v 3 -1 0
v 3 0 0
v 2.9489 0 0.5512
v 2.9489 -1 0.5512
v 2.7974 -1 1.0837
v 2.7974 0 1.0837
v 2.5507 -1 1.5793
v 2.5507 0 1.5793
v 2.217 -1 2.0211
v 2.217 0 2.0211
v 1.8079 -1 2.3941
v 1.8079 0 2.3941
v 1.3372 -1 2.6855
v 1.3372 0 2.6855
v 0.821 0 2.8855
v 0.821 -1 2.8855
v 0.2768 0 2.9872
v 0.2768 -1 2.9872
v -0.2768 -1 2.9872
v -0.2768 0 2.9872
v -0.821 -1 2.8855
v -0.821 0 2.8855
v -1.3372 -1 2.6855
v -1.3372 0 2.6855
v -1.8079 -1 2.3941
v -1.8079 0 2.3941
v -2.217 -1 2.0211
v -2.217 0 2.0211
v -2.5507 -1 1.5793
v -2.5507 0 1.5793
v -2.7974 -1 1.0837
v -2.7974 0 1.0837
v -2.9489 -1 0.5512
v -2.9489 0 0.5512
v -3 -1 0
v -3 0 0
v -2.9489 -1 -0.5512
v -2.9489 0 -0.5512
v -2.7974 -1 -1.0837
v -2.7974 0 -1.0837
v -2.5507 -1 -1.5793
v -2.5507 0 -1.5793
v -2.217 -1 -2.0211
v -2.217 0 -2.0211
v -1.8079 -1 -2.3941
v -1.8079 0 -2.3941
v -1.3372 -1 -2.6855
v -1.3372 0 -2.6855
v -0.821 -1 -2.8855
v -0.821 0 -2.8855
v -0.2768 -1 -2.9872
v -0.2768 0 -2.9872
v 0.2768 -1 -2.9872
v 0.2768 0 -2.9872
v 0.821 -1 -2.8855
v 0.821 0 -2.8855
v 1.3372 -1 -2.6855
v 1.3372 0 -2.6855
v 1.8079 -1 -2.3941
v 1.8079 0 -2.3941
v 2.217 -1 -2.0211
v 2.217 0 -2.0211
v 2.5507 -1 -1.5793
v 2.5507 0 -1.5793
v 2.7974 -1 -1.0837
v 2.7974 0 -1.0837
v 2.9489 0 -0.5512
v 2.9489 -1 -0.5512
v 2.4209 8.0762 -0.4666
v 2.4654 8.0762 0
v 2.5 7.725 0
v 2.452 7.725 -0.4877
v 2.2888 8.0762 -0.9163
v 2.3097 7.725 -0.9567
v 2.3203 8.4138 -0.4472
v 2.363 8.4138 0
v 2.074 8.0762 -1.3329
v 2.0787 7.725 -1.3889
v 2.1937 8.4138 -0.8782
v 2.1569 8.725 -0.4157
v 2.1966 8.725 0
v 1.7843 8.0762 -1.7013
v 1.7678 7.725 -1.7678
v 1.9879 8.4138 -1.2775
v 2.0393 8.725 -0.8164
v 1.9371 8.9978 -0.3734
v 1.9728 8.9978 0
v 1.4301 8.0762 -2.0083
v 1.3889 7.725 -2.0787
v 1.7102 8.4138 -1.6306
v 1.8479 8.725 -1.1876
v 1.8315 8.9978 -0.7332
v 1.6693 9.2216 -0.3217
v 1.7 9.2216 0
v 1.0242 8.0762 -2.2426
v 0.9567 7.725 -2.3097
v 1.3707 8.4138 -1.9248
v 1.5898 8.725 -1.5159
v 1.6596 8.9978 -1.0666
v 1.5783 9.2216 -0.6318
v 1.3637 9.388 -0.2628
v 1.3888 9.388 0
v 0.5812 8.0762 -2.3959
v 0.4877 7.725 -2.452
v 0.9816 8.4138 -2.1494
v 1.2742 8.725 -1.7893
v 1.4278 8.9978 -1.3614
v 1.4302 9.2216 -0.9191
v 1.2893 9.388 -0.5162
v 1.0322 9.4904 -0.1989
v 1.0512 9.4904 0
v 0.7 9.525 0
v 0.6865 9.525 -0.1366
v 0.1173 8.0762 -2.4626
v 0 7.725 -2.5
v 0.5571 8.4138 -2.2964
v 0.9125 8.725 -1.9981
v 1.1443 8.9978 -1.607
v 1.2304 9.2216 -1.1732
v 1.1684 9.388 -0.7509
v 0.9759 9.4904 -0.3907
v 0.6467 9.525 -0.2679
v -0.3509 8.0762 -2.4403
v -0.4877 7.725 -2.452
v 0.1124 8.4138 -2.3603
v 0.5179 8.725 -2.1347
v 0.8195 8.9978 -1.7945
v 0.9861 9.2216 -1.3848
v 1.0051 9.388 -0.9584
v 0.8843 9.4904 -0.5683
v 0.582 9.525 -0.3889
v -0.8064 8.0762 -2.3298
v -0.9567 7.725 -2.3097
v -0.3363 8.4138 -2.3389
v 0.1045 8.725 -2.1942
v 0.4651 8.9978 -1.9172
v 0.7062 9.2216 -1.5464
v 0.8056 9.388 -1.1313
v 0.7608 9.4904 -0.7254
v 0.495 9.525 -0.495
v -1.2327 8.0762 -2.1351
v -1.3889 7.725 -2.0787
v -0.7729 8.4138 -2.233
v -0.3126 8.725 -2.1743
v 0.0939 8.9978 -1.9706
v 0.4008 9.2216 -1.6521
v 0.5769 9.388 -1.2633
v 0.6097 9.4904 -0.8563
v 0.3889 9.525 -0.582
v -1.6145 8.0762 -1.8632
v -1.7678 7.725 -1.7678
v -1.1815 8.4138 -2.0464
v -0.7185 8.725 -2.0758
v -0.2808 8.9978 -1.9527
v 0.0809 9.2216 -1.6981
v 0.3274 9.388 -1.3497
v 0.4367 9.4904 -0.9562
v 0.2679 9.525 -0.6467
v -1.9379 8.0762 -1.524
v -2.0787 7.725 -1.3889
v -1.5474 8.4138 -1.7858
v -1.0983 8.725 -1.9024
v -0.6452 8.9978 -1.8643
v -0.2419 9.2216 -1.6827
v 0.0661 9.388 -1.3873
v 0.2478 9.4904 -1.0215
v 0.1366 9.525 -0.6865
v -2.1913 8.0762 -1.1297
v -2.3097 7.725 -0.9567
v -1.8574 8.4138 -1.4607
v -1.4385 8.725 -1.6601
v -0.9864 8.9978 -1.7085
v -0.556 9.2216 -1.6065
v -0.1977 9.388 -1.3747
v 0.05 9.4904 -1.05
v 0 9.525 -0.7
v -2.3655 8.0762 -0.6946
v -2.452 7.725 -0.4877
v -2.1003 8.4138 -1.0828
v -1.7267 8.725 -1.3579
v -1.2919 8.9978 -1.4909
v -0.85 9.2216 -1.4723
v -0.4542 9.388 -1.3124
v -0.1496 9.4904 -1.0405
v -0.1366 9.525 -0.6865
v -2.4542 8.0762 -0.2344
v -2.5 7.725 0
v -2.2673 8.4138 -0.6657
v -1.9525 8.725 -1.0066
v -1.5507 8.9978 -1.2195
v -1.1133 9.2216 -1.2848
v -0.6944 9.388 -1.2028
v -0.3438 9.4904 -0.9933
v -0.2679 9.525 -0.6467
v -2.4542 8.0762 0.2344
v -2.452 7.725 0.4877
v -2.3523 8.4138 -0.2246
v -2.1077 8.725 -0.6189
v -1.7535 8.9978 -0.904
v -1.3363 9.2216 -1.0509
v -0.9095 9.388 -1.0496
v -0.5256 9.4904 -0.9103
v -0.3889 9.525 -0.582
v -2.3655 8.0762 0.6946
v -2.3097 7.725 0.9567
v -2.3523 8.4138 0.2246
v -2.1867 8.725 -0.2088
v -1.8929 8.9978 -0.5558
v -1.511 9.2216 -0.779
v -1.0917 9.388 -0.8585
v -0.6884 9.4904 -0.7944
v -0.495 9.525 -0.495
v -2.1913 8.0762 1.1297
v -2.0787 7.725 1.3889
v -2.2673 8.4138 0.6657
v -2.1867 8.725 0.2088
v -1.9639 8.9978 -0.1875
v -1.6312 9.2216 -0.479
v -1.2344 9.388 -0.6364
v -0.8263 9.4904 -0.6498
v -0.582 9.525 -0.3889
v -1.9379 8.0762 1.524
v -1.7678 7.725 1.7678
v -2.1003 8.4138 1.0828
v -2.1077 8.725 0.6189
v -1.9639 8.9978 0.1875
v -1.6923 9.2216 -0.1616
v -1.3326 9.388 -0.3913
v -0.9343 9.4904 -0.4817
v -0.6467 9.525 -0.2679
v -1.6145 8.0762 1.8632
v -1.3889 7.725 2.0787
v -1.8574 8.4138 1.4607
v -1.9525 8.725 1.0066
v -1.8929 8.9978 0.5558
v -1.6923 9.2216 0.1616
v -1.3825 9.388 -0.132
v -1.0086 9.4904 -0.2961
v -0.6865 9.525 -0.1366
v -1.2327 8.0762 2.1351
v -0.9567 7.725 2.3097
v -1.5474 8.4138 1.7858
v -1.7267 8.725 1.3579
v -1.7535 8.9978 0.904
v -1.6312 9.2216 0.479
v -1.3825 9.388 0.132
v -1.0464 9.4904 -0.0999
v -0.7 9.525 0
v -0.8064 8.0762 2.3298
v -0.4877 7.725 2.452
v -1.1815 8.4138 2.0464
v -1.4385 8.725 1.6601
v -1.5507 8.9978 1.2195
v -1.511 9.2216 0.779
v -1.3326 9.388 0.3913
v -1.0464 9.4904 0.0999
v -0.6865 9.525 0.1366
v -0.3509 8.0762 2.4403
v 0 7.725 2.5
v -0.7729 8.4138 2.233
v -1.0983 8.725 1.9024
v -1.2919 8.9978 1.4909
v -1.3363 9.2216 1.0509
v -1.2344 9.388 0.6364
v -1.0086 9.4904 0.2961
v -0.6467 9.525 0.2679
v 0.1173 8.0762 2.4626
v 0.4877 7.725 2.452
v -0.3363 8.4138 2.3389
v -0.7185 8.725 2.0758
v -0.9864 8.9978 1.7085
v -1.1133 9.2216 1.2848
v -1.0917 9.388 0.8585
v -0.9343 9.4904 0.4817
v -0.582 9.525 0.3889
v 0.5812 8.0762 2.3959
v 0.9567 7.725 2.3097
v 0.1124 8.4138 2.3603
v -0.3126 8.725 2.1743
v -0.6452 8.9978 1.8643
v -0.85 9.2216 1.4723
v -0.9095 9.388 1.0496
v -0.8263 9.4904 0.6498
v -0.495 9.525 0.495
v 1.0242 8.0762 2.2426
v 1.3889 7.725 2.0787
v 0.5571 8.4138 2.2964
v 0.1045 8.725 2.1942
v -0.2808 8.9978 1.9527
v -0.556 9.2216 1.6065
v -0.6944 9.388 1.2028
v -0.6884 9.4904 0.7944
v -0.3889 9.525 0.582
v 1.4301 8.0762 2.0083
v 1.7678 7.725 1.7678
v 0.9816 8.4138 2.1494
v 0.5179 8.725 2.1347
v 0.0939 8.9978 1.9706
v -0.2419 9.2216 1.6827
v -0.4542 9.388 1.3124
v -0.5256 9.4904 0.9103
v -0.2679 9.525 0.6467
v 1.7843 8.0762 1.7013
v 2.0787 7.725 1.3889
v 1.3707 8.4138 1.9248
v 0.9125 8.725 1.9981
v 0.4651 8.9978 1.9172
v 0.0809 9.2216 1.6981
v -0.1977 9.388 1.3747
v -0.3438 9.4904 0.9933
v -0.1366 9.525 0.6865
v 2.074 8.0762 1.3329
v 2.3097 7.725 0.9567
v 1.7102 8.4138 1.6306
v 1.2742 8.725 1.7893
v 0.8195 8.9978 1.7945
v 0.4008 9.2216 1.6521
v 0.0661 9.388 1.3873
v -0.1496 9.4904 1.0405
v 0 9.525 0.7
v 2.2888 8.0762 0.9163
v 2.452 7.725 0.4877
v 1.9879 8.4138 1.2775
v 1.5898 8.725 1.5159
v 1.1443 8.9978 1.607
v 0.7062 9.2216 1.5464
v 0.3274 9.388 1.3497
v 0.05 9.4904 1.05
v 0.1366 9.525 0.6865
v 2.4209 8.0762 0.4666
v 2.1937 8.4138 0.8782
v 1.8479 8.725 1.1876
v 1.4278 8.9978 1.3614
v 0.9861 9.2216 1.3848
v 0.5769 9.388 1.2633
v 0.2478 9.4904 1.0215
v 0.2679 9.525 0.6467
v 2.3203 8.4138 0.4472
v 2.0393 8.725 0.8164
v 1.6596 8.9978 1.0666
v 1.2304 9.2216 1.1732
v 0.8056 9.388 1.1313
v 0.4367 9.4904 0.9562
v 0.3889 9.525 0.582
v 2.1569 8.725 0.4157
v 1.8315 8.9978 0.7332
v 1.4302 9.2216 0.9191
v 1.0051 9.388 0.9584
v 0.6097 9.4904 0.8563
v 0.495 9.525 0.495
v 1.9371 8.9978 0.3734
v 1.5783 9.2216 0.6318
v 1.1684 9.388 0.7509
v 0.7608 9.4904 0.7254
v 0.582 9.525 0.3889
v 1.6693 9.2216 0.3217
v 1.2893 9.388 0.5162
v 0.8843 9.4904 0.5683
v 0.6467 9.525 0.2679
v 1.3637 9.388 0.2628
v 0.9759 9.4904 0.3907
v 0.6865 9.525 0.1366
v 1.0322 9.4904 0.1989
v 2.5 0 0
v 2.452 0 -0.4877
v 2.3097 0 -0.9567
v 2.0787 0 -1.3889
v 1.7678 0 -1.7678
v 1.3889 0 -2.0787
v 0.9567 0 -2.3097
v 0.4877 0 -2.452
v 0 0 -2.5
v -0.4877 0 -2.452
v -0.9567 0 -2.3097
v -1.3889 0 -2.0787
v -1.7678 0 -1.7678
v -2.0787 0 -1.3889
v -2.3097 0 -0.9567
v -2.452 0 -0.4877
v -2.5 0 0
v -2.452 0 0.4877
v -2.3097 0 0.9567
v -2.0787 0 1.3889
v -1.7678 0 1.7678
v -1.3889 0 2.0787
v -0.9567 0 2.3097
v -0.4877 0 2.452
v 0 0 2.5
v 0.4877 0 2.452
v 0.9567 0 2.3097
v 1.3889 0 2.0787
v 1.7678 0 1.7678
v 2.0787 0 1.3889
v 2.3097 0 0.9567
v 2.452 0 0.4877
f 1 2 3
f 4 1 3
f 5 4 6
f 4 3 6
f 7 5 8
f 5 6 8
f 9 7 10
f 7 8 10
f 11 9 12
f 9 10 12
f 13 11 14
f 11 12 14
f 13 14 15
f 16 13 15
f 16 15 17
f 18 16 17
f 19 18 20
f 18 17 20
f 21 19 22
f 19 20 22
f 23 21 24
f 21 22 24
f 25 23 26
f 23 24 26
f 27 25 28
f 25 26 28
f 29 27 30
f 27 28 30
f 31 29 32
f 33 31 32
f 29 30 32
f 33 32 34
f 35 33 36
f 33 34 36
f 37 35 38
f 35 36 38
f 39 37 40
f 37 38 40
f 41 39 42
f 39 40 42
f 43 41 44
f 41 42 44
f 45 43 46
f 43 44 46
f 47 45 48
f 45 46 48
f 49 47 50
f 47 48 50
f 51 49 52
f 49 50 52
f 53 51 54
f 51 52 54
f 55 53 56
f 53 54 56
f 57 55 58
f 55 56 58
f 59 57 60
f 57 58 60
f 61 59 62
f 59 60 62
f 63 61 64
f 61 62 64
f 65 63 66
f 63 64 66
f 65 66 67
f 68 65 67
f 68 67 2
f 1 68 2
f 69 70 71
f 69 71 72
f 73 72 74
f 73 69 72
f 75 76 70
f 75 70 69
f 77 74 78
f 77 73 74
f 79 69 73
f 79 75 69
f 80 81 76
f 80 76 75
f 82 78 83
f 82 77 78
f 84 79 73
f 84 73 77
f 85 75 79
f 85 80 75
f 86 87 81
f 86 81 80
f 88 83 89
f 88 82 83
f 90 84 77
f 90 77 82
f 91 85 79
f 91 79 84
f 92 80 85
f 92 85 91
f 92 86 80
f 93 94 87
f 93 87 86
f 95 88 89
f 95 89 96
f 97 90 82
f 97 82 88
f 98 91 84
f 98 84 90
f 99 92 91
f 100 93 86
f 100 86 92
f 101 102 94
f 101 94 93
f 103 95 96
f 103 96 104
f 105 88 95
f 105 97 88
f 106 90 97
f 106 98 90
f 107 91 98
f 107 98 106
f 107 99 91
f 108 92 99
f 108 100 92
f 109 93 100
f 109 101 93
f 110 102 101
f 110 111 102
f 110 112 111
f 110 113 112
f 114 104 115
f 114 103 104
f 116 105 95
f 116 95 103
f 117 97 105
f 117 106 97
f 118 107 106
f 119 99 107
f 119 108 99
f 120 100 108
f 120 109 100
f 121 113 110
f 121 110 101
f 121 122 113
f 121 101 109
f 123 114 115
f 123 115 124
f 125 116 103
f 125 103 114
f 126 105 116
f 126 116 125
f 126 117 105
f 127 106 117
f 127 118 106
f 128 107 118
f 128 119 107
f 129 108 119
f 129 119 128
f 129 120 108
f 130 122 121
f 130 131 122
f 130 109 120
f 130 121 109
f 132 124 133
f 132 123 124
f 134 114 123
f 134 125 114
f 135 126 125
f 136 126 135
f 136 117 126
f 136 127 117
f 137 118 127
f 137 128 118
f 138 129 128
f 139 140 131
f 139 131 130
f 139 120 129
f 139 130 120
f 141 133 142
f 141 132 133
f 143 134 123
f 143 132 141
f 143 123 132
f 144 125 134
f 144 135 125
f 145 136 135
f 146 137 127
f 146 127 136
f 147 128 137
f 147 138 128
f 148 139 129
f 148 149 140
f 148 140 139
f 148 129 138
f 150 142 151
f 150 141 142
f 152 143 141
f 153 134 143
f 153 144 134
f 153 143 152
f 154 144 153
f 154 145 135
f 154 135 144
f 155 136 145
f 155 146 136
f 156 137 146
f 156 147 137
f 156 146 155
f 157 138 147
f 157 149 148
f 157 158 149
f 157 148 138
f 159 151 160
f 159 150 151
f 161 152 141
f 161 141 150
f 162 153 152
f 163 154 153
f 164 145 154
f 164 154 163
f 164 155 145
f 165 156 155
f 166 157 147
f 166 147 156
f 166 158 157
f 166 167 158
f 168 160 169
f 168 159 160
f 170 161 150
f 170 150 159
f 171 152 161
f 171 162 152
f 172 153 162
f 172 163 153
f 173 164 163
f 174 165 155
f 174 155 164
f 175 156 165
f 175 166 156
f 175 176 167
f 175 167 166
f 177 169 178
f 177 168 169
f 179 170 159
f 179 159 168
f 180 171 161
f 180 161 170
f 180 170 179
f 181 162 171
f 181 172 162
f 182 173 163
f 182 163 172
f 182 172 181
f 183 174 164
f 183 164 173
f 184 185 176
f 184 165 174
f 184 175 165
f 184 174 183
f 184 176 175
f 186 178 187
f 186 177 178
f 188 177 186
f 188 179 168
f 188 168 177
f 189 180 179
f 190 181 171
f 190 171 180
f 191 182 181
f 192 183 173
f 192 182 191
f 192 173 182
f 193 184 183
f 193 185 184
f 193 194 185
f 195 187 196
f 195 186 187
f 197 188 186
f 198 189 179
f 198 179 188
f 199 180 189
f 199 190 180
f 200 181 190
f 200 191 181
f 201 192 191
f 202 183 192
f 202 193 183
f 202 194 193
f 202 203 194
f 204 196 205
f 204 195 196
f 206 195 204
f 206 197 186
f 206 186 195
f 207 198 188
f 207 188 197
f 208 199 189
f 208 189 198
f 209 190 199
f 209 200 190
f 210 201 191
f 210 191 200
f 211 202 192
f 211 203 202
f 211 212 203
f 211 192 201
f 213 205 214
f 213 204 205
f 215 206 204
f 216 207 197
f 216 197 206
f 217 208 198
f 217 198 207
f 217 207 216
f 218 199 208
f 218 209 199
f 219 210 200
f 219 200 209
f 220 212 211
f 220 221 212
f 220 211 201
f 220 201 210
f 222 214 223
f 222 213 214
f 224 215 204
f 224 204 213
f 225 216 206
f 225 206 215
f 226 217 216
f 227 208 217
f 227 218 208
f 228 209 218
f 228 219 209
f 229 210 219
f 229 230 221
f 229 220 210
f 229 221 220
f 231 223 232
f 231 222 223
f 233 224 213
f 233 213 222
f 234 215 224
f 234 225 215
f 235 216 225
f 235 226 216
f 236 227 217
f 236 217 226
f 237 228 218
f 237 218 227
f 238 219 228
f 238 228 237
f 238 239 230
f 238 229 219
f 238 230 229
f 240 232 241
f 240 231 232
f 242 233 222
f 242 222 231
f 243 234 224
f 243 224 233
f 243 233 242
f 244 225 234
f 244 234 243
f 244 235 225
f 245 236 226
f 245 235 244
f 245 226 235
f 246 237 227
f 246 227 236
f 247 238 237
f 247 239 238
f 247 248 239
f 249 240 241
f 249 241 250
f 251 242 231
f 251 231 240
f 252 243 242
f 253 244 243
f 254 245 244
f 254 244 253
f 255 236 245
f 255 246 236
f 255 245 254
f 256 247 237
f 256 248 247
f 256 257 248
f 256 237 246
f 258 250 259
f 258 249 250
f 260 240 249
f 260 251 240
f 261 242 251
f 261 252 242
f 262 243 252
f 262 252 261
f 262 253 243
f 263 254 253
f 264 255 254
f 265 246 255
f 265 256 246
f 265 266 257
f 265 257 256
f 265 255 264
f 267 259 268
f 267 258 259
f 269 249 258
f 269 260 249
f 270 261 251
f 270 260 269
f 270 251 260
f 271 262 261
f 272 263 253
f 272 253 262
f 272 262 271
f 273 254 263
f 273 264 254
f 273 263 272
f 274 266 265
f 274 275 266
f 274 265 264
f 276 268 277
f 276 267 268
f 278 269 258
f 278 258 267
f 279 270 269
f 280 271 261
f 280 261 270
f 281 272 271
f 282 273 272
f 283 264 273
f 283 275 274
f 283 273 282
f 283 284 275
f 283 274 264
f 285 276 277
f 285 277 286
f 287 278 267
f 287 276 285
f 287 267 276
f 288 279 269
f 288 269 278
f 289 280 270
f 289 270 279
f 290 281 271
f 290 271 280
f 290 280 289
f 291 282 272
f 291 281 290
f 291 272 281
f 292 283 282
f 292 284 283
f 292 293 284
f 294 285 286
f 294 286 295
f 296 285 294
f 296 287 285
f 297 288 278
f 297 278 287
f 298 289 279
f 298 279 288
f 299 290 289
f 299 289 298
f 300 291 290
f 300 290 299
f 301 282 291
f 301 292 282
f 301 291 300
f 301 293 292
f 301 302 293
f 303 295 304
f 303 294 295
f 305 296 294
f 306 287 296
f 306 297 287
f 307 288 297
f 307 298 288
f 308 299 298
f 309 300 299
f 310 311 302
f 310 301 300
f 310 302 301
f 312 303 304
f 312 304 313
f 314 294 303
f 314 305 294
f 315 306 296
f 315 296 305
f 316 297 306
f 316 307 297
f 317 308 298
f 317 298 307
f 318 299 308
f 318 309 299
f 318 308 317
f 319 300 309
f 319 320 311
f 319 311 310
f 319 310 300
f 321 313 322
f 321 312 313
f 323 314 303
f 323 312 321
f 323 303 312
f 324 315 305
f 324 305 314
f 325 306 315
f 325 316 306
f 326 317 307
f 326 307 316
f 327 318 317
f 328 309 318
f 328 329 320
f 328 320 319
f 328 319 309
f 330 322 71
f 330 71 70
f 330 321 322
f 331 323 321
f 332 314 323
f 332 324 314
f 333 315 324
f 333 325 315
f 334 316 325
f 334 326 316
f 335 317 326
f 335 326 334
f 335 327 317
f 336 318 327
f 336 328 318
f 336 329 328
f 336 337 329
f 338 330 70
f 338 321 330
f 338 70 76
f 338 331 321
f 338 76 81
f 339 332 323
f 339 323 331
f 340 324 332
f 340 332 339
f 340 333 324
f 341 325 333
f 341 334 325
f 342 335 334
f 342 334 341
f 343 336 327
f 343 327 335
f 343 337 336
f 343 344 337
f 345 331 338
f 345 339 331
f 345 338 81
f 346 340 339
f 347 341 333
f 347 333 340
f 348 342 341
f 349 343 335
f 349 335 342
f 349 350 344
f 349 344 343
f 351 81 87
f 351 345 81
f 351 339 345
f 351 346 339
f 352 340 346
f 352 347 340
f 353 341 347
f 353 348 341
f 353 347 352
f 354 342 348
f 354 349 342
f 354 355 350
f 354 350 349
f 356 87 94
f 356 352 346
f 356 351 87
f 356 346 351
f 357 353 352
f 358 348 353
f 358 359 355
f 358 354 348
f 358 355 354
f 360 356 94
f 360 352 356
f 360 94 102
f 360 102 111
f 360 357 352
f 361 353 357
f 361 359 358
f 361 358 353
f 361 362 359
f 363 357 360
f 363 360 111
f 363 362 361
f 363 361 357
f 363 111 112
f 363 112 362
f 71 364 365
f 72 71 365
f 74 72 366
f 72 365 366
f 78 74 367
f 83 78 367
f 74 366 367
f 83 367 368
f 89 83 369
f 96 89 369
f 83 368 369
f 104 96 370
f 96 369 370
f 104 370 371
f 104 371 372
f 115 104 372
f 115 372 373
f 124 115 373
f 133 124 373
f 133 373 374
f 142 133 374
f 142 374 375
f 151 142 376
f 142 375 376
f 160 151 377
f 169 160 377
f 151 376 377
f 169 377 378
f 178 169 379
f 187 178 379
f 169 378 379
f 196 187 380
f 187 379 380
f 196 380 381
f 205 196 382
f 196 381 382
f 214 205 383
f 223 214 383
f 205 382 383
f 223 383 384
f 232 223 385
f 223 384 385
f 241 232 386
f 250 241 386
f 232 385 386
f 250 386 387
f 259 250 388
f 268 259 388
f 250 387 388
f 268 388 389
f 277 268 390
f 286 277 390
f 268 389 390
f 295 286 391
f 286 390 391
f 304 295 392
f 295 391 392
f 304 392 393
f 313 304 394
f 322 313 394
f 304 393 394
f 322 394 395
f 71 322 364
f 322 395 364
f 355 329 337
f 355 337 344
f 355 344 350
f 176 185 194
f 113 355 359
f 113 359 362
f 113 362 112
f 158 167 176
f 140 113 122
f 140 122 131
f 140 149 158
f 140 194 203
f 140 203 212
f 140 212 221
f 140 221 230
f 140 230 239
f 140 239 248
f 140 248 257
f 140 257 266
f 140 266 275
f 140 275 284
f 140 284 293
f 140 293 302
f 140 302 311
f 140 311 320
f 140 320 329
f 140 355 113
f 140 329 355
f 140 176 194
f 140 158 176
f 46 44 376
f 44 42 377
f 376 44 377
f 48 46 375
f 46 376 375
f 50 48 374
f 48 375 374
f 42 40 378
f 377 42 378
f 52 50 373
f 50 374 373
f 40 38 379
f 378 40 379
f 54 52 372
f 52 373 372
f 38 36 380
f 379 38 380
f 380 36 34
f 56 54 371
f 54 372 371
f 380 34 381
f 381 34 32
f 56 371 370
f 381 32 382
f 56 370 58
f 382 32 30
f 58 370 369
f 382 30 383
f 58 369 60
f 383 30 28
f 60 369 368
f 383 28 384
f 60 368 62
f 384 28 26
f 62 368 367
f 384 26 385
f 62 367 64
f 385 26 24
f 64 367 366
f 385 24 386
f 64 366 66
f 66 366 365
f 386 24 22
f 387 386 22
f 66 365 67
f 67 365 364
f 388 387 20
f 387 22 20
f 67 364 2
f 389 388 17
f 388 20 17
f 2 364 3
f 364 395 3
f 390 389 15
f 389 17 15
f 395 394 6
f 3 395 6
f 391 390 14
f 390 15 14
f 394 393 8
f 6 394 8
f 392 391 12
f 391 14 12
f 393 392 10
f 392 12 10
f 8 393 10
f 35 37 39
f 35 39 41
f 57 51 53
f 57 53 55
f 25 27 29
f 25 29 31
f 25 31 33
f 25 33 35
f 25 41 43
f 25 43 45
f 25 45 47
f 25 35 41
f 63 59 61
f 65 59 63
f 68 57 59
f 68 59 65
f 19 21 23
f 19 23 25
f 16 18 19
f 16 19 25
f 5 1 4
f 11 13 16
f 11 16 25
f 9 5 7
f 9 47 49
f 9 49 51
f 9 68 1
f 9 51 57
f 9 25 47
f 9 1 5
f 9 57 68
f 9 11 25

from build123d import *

# Parameters (mm, degrees)
SKETCH1_R           = 2.5
BOSS_EXTRUDE1_DEPTH = 9.525
SKETCH2_R           = 3
BOSS_EXTRUDE2_DEPTH = 1
FILLET1_R           = 1.8


with BuildPart() as part:
    # Sketch1 → Boss-Extrude1 (new body)
    with BuildSketch(Plane(origin=(0, 0, 0), x_dir=(1, 0, 0), z_dir=(0, 1, 0))):
        Circle(SKETCH1_R)
    extrude(amount=BOSS_EXTRUDE1_DEPTH)

    # Sketch2 → Boss-Extrude2 (add)
    with BuildSketch(Plane.XZ):
        Circle(SKETCH2_R)
    extrude(amount=BOSS_EXTRUDE2_DEPTH)

    # Fillet1
    fillet1_edges = [part.edges().sort_by_distance(p)[0] for p in [
        (-2.5, 9.525, 0),
    ]]
    fillet(fillet1_edges, radius=FILLET1_R)


solid = part.part
